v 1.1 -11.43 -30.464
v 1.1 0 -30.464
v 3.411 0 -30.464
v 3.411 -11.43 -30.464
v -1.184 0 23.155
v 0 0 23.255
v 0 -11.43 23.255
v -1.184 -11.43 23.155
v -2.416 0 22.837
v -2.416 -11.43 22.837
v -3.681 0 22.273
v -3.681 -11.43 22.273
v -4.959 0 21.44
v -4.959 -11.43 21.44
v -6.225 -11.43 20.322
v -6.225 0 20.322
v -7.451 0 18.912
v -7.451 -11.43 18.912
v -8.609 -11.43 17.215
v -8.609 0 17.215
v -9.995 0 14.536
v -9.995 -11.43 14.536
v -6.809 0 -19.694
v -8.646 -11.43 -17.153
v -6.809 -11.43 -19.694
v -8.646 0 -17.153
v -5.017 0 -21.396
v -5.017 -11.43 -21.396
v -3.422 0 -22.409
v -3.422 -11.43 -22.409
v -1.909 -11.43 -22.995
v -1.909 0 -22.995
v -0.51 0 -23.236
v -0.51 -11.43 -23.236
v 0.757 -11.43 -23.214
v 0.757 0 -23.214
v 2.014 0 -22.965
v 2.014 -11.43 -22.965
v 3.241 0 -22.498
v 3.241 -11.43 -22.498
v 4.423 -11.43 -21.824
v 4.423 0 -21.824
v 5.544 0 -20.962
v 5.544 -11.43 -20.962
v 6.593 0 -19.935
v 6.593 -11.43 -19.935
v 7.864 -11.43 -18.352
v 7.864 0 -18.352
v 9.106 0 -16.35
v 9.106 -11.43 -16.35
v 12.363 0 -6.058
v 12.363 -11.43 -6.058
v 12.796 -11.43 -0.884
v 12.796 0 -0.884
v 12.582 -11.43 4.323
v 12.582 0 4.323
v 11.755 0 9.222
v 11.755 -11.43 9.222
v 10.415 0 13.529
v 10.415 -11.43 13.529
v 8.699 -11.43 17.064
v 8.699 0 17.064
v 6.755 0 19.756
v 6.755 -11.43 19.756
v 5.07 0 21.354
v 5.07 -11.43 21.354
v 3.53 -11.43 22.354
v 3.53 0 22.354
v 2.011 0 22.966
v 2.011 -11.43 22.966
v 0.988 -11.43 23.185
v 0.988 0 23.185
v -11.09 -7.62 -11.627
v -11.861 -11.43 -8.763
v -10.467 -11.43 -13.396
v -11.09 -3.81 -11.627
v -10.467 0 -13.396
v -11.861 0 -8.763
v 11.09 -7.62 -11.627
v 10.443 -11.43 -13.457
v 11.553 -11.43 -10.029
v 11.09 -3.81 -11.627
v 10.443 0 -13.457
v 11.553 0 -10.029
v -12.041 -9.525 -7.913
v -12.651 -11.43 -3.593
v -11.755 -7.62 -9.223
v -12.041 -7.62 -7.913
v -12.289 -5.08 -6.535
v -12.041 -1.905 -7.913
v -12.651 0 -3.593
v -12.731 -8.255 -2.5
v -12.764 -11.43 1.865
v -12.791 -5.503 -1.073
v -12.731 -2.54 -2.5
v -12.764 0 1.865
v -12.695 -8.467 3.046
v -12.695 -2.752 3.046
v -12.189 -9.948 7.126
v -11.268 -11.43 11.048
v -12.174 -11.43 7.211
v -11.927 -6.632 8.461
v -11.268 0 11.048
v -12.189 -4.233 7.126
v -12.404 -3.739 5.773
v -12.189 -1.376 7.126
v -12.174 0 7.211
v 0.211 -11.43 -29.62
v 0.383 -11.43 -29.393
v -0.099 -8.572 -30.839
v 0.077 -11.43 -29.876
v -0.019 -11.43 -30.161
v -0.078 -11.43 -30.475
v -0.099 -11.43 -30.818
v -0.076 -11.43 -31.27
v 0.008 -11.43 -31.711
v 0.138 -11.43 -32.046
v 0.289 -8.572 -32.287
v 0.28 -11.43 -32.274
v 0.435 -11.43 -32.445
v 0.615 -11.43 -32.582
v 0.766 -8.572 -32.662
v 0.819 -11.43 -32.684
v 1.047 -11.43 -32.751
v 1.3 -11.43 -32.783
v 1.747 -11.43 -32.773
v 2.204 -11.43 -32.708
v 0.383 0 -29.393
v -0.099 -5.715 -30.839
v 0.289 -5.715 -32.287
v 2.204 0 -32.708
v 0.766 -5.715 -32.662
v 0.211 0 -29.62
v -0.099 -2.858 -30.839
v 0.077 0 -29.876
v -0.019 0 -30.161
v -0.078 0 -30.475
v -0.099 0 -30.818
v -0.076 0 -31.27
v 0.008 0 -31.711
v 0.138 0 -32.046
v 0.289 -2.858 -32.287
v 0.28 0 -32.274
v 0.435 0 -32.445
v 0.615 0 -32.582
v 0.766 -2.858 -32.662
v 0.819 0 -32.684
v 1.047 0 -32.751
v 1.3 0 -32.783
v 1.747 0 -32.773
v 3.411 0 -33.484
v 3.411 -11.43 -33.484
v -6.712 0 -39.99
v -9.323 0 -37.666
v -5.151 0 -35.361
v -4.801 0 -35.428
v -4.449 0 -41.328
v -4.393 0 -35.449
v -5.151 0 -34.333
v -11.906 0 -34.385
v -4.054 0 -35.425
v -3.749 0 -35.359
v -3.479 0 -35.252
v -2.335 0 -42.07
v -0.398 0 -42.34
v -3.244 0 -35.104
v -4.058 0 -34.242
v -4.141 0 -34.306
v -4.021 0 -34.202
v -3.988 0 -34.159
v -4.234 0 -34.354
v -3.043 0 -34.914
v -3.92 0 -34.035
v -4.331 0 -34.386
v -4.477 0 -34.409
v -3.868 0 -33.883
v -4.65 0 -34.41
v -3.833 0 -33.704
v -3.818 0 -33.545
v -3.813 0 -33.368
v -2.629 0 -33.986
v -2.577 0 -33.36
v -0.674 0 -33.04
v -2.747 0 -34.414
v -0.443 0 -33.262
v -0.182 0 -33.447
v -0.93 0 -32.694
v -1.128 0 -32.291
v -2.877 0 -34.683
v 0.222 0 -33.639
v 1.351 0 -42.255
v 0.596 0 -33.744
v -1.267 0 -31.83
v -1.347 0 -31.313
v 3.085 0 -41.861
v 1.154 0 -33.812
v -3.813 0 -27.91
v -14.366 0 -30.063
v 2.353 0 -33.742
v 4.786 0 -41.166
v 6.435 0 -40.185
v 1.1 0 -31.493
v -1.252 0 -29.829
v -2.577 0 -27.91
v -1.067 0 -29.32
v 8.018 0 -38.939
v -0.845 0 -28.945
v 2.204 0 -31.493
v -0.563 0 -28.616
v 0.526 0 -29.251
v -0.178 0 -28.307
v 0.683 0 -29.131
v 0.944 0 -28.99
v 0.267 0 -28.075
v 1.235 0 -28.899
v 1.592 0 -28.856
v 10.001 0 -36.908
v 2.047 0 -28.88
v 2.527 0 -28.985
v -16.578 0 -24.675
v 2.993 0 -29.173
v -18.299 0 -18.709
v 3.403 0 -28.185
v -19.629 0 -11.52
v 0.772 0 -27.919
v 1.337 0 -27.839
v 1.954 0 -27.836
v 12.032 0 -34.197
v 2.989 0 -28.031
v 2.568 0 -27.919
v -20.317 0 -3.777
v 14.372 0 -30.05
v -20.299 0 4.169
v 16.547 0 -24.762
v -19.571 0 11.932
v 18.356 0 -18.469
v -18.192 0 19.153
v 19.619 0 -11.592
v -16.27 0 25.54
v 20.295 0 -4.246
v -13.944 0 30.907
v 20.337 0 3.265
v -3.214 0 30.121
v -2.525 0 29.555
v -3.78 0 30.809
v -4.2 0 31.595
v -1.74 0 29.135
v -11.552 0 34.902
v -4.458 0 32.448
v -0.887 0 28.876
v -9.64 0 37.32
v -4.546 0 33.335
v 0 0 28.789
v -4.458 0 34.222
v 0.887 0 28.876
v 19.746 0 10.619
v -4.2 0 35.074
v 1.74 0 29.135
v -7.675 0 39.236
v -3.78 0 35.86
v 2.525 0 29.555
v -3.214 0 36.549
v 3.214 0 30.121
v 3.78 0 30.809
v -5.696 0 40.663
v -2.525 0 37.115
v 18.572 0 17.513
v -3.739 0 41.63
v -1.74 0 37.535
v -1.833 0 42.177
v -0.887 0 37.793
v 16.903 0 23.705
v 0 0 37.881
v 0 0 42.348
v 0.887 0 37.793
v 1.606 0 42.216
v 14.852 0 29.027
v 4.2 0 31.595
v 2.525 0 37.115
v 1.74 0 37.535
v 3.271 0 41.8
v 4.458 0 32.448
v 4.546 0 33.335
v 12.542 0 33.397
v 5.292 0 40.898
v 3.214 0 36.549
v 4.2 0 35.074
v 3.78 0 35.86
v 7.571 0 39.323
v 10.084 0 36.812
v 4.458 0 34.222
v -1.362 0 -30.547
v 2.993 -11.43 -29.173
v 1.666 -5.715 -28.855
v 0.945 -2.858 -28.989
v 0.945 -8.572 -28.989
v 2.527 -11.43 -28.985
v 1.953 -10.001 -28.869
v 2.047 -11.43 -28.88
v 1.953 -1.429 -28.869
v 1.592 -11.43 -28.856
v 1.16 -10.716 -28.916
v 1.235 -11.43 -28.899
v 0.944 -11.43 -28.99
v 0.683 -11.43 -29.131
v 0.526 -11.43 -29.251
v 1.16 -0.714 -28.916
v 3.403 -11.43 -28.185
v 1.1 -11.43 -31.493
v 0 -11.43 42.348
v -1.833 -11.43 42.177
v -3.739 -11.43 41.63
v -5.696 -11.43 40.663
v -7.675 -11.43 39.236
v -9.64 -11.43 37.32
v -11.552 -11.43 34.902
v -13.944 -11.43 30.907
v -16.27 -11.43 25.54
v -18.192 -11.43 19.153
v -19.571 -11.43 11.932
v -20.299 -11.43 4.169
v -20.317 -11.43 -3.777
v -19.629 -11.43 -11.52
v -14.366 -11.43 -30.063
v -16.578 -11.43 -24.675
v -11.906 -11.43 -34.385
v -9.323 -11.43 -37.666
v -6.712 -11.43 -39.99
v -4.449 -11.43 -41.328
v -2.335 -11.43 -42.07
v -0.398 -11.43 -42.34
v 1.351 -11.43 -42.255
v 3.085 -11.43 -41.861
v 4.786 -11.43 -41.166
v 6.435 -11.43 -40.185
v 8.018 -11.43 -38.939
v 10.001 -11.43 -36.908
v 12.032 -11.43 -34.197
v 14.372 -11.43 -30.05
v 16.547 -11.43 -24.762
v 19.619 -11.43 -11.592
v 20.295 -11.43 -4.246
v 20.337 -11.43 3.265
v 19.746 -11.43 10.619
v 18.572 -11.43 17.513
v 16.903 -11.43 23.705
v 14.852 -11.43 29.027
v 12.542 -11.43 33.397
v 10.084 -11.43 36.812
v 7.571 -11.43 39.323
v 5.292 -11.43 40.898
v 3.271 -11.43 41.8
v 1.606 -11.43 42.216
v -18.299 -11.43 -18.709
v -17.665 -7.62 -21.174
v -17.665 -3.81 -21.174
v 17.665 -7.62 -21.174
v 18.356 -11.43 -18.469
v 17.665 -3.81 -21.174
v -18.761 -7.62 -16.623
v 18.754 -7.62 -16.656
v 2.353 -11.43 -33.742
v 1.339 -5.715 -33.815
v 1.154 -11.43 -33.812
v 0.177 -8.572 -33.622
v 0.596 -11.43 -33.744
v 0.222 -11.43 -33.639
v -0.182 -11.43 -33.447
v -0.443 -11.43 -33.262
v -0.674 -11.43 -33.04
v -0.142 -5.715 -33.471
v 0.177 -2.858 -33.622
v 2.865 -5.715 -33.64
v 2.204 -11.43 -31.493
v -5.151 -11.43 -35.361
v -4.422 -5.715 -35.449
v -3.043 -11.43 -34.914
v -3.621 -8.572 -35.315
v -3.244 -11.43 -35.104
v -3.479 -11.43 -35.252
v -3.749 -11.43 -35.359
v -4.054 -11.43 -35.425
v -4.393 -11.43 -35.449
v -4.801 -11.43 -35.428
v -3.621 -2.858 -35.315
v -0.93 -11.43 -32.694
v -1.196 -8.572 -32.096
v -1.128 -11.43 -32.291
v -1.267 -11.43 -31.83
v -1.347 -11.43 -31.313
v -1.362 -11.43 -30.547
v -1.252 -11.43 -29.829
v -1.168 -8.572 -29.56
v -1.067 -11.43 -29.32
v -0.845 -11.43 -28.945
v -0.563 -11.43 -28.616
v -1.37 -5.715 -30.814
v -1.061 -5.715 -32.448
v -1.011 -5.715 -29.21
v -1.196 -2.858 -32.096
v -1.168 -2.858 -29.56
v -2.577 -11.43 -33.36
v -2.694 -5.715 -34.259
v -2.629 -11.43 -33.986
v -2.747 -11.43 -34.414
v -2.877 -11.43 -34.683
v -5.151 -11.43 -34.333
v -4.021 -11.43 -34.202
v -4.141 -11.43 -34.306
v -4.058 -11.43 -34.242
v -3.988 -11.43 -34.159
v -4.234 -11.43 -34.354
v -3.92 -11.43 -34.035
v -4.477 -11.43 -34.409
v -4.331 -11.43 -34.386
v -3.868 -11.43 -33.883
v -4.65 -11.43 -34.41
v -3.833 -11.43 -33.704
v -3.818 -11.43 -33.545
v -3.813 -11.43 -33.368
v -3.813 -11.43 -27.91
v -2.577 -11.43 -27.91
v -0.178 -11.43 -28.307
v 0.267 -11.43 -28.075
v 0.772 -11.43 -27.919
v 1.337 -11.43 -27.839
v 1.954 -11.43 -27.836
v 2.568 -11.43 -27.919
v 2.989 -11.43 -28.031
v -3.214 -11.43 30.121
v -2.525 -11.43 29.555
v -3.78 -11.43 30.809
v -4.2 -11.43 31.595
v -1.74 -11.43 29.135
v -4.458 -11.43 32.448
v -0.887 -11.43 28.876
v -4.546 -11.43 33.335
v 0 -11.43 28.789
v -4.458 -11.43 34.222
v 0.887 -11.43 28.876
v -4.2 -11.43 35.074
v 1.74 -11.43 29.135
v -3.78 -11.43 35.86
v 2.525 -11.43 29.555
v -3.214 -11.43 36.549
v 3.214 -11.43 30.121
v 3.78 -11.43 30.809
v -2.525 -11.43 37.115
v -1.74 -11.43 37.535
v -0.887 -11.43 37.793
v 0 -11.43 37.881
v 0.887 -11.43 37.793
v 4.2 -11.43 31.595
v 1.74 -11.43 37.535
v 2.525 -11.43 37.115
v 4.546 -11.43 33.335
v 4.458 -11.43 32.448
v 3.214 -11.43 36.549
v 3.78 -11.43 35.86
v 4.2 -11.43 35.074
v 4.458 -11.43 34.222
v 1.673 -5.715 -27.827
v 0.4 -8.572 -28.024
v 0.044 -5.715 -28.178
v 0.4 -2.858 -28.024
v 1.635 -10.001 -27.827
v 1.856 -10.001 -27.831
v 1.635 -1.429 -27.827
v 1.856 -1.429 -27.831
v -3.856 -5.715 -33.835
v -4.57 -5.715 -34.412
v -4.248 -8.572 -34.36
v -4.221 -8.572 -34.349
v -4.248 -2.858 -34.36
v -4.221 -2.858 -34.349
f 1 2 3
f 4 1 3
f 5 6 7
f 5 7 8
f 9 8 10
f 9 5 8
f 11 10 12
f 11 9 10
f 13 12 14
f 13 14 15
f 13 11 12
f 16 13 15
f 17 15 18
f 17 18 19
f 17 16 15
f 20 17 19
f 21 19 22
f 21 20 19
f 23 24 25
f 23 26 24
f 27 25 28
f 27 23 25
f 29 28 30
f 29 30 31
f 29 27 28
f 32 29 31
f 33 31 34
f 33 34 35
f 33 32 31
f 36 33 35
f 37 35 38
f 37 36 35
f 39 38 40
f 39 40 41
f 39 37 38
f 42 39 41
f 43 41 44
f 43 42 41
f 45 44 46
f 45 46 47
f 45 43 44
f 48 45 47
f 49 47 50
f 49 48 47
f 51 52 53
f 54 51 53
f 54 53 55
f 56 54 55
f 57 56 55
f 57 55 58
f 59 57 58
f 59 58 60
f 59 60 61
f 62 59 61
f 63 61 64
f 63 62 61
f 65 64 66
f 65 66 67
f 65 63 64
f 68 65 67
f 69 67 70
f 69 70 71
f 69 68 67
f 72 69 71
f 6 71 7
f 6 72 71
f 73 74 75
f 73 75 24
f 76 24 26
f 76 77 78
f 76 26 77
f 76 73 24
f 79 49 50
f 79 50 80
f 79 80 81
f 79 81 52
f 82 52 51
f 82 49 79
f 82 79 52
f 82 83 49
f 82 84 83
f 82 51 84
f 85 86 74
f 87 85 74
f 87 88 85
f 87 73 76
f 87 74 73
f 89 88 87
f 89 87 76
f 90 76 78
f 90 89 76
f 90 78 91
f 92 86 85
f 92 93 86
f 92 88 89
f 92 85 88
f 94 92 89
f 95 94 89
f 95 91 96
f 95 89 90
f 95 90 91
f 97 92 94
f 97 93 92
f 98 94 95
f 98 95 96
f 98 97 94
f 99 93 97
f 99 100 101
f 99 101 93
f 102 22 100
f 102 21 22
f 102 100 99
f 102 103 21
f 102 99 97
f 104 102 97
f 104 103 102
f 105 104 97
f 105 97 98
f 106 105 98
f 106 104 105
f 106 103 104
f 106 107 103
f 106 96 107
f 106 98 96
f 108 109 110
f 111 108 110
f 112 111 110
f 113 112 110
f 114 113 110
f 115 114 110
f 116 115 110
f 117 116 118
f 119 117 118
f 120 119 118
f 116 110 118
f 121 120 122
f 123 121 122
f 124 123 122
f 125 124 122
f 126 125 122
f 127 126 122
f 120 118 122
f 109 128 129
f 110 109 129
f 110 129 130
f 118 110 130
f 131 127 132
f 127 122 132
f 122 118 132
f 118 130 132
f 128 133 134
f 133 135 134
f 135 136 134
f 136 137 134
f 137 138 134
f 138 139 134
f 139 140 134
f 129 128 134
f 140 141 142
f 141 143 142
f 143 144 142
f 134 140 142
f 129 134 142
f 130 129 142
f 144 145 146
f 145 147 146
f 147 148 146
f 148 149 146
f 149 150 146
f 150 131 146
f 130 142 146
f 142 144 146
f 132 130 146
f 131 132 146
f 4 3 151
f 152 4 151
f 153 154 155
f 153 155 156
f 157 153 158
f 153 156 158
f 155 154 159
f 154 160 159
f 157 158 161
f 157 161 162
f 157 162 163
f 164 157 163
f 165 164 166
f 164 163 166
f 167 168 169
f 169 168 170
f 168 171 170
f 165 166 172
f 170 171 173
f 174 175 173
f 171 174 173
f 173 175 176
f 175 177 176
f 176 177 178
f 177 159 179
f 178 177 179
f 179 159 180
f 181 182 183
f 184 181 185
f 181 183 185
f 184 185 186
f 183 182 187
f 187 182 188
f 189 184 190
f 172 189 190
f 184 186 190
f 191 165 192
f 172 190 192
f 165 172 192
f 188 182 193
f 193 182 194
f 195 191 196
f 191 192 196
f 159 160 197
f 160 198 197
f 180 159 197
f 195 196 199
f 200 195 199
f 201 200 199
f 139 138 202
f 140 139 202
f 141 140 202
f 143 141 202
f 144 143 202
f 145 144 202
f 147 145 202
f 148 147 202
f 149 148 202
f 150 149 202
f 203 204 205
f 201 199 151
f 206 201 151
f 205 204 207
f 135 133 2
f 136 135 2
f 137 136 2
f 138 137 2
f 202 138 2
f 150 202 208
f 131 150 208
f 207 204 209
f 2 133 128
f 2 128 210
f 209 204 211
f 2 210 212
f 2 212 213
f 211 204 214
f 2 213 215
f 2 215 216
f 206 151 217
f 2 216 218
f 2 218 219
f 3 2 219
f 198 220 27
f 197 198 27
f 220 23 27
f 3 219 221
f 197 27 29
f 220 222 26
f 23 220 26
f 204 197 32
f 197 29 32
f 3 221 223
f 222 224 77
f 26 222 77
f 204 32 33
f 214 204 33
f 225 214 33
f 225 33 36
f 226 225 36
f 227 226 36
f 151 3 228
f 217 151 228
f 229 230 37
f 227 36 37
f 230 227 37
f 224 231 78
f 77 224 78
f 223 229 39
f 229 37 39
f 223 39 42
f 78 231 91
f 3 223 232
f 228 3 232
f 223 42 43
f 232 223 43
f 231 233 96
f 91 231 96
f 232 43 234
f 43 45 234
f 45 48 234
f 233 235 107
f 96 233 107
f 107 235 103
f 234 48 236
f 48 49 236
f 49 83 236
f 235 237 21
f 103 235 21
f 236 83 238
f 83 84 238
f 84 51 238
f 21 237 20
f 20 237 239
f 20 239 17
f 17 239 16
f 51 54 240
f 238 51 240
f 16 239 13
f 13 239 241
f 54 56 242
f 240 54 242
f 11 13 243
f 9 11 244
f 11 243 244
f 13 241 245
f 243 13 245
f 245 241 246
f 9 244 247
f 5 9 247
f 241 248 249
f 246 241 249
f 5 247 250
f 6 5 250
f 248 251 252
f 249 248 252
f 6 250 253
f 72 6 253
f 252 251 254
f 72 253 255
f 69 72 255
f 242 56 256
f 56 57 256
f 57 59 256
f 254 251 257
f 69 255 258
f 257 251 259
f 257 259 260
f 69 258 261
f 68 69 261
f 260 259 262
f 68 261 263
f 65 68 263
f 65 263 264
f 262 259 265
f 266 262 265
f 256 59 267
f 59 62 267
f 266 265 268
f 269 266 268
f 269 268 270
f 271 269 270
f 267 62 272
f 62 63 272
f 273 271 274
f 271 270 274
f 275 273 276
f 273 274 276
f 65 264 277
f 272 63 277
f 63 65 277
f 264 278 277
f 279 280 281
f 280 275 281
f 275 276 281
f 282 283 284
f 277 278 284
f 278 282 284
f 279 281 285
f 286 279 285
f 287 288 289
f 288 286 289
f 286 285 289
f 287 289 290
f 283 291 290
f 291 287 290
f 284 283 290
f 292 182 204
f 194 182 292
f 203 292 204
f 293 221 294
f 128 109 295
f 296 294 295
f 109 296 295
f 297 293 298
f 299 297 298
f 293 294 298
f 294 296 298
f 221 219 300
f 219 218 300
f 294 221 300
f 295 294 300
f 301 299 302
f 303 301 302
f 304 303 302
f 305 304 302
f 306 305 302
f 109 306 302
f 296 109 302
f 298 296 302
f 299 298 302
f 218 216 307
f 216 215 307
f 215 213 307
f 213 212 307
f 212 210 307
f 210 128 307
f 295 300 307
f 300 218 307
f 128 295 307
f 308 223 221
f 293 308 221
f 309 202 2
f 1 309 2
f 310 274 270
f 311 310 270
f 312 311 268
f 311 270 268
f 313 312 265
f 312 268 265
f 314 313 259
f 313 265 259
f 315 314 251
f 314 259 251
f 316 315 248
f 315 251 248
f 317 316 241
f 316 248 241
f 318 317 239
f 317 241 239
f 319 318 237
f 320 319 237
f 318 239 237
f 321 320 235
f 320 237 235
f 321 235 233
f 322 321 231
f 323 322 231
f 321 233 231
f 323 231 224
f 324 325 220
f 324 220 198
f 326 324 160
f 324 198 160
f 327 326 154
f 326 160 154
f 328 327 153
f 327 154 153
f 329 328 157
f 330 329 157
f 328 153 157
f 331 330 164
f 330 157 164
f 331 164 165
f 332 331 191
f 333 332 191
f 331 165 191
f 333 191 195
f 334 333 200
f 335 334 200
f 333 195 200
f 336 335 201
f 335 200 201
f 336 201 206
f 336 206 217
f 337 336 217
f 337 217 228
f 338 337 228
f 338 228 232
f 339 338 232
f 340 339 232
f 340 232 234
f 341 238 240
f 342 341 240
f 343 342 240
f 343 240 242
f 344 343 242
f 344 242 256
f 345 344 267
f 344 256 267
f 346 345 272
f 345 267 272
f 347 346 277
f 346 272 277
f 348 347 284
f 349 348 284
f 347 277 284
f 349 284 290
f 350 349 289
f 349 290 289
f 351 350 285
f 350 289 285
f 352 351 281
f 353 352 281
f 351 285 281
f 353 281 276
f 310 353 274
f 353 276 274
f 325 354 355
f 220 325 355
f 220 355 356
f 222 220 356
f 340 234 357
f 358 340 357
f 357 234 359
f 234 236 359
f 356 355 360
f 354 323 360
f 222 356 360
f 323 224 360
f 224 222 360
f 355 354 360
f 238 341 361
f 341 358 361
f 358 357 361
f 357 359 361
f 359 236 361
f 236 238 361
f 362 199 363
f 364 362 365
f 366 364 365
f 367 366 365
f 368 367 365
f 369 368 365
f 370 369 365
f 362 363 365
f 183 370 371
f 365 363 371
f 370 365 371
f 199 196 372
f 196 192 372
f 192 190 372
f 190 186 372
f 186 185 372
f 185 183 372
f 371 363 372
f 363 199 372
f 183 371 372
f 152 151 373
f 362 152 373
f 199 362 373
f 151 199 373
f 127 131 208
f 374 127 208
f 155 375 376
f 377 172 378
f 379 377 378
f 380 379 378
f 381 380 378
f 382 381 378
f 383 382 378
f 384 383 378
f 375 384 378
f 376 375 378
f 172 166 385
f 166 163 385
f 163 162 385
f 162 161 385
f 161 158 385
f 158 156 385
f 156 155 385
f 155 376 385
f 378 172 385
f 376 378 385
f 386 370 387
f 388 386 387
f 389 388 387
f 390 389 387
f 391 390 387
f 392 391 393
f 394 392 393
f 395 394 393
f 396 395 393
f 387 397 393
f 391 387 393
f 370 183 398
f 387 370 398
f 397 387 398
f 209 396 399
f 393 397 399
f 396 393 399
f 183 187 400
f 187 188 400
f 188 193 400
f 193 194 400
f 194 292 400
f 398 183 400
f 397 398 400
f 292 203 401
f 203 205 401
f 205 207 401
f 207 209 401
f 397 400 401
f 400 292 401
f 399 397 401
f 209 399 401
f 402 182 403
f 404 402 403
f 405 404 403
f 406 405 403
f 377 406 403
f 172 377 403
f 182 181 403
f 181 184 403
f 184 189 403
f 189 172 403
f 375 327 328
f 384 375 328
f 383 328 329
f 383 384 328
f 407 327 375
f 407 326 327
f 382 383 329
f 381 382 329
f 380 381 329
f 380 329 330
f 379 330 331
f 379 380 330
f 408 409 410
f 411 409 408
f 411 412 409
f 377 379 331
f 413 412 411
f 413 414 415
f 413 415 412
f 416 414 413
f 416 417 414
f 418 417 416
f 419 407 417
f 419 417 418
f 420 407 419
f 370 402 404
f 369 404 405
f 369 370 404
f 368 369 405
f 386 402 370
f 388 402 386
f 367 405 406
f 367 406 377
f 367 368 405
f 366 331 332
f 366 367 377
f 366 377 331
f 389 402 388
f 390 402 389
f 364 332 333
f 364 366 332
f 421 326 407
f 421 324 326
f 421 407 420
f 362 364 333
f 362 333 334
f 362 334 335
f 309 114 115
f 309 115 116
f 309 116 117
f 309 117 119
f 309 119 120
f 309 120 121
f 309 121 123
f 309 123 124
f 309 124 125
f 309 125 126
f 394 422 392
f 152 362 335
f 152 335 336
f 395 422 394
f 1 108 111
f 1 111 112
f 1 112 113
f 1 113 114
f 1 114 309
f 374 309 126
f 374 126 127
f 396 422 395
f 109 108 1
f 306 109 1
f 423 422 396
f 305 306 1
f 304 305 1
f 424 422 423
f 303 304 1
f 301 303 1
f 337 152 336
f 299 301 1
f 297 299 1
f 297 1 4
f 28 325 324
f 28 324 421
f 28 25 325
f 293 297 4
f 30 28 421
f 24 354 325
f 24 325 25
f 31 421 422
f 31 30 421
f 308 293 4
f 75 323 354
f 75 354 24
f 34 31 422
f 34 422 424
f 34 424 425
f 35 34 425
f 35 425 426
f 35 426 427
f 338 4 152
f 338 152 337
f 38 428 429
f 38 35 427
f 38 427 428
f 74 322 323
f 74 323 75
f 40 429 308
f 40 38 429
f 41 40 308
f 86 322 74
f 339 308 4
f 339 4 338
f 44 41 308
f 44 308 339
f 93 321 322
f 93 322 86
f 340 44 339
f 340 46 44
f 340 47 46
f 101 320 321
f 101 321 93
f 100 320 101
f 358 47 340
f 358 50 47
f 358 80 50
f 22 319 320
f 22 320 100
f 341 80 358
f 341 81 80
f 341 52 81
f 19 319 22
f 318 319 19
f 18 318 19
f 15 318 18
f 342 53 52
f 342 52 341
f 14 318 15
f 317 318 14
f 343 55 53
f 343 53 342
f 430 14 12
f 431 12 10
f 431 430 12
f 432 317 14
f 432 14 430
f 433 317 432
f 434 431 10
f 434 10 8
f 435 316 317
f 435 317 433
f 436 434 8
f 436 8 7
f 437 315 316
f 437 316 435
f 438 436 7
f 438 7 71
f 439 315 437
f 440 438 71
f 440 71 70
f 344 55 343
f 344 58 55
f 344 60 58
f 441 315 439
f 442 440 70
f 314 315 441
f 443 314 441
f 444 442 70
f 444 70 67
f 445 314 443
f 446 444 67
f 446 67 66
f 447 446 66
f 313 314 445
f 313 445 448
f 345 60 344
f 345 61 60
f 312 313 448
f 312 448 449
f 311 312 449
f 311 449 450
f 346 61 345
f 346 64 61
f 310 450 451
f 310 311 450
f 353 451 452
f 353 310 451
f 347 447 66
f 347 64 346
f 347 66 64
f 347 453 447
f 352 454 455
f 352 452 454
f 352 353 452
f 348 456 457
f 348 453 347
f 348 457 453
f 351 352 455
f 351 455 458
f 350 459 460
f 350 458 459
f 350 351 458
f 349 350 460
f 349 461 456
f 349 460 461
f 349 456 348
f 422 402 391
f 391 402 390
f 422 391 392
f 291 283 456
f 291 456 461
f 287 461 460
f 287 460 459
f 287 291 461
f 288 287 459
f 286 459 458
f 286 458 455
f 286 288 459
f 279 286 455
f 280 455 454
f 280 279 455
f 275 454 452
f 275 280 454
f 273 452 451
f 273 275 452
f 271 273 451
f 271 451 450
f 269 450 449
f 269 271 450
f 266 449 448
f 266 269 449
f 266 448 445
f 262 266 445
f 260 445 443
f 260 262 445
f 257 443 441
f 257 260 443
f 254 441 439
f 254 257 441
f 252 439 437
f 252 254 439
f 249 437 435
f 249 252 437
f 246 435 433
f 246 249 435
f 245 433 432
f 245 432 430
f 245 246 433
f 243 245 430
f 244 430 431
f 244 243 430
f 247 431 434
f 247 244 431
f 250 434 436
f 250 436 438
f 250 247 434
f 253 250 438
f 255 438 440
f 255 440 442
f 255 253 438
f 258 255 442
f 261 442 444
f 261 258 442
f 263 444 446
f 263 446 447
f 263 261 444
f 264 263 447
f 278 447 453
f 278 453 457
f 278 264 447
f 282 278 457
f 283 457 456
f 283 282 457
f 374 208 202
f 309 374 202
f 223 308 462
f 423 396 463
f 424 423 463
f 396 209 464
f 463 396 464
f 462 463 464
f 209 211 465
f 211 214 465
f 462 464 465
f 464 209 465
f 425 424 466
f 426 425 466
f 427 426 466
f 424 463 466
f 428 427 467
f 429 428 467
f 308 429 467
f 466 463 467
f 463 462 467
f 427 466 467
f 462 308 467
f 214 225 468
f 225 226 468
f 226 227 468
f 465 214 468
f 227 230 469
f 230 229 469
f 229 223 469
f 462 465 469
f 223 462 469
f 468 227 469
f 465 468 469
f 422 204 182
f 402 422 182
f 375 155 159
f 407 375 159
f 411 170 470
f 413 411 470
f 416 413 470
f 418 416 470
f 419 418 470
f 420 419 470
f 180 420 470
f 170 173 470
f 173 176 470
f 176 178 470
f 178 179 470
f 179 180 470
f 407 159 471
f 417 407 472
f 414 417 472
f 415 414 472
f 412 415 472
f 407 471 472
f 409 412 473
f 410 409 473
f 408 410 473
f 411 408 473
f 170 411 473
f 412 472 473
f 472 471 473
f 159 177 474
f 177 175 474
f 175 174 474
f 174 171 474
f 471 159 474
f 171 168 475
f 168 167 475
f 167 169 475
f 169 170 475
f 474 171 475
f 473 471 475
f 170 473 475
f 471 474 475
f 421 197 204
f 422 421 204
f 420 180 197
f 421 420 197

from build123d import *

# Parameters (mm, degrees)
F0_R     = 4.5457502189
F1_DEPTH = 11.43


with BuildPart() as f1:
    # F0 (on Front) → F1 (new body)
    with BuildSketch(Plane.XZ):
        with BuildLine():
            add(Edge.make_bspline(
                [(0, 42.3479527235), (-35.330022789, 42.3479527235), (-17.6650113945, -21.1739763618), (0, -84.695905447), (17.6650113945, -21.1739763618), (35.330022789, 42.3479527235), (0, 42.3479527235)],
                knots=[0, 0, 0, 2.0943951024, 2.0943951024, 4.1887902048, 4.1887902048, 6.2831853072, 6.2831853072, 6.2831853072], degree=2, weights=[1, 0.5, 1, 0.5, 1, 0.5, 1]))
        make_face()
        with BuildLine():
            add(Edge.make_bspline(
                [(-3.0432494103, -34.9144779167), (-3.5092350239, -35.4486720947), (-4.4220823543, -35.4486720947)],
                knots=[0, 0, 0, 1, 1, 1], degree=2))
            add(Edge.make_bspline(
                [(-4.4220823543, -35.4486720947), (-4.8402582264, -35.4486720947), (-5.1513402775, -35.3607021704)],
                knots=[0, 0, 0, 1, 1, 1], degree=2))
            Line((-5.1513402775, -35.3607021704), (-5.1513402775, -34.3331114604))
            add(Edge.make_bspline(
                [(-5.1513402775, -34.3331114604), (-4.8326086677, -34.4121568996), (-4.5699738213, -34.4121568996)],
                knots=[0, 0, 0, 1, 1, 1], degree=2))
            add(Edge.make_bspline(
                [(-4.5699738213, -34.4121568996), (-4.1632722872, -34.4121568996), (-3.9879699018, -34.1590840015)],
                knots=[0, 0, 0, 1, 1, 1], degree=2))
            add(Edge.make_bspline(
                [(-3.9879699018, -34.1590840015), (-3.8126675164, -33.9060111033), (-3.8126675164, -33.3679921459)],
                knots=[0, 0, 0, 1, 1, 1], degree=2))
            Line((-3.8126675164, -33.3679921459), (-3.8126675164, -27.9100320598))
            Line((-3.8126675164, -27.9100320598), (-2.5772637968, -27.9100320598))
            Line((-2.5772637968, -27.9100320598), (-2.5772637968, -33.3603425873))
            add(Edge.make_bspline(
                [(-2.5772637968, -33.3603425873), (-2.5772637968, -34.3802837387), (-3.0432494103, -34.9144779167)],
                knots=[0, 0, 0, 1, 1, 1], degree=2))
        make_face(mode=Mode.SUBTRACT)
        with BuildLine():
            Line((1.0996240538, -31.4925753539), (1.0996240538, -30.4637097175))
            Line((1.0996240538, -30.4637097175), (3.411065688, -30.4637097175))
            Line((3.411065688, -30.4637097175), (3.411065688, -33.4840104519))
            add(Edge.make_bspline(
                [(3.411065688, -33.4840104519), (2.8488231284, -33.6675998591), (2.3528767435, -33.7415455926)],
                knots=[0, 0, 0, 1, 1, 1], degree=2))
            add(Edge.make_bspline(
                [(2.3528767435, -33.7415455926), (1.8569303587, -33.8154913261), (1.3393102244, -33.8154913261)],
                knots=[0, 0, 0, 1, 1, 1], degree=2))
            add(Edge.make_bspline(
                [(1.3393102244, -33.8154913261), (0.0210362862, -33.8154913261), (-0.6744360863, -33.0403360511)],
                knots=[0, 0, 0, 1, 1, 1], degree=2))
            add(Edge.make_bspline(
                [(-0.6744360863, -33.0403360511), (-1.3699084589, -32.265180776), (-1.3699084589, -30.8143144883)],
                knots=[0, 0, 0, 1, 1, 1], degree=2))
            add(Edge.make_bspline(
                [(-1.3699084589, -30.8143144883), (-1.3699084589, -29.4042458465), (-0.5628800229, -28.6157038439)],
                knots=[0, 0, 0, 1, 1, 1], degree=2))
            add(Edge.make_bspline(
                [(-0.5628800229, -28.6157038439), (0.2441484131, -27.8271618412), (1.6733409514, -27.8271618412)],
                knots=[0, 0, 0, 1, 1, 1], degree=2))
            add(Edge.make_bspline(
                [(1.6733409514, -27.8271618412), (2.5708891646, -27.8271618412), (3.4034161294, -28.1854161706)],
                knots=[0, 0, 0, 1, 1, 1], degree=2))
            Line((3.4034161294, -28.1854161706), (2.992889816, -29.173484161))
            add(Edge.make_bspline(
                [(2.992889816, -29.173484161), (2.3554265964, -28.8547525512), (1.6656913928, -28.8547525512)],
                knots=[0, 0, 0, 1, 1, 1], degree=2))
            add(Edge.make_bspline(
                [(1.6656913928, -28.8547525512), (0.865037589, -28.8547525512), (0.383115395, -29.3927715086)],
                knots=[0, 0, 0, 1, 1, 1], degree=2))
            add(Edge.make_bspline(
                [(0.383115395, -29.3927715086), (-0.098806799, -29.9307904659), (-0.098806799, -30.8385380906)],
                knots=[0, 0, 0, 1, 1, 1], degree=2))
            add(Edge.make_bspline(
                [(-0.098806799, -30.8385380906), (-0.098806799, -31.7870833613), (0.2894083017, -32.2868545255)],
                knots=[0, 0, 0, 1, 1, 1], degree=2))
            add(Edge.make_bspline(
                [(0.2894083017, -32.2868545255), (0.6776234024, -32.7866256897), (1.4183556636, -32.7866256897)],
                knots=[0, 0, 0, 1, 1, 1], degree=2))
            add(Edge.make_bspline(
                [(1.4183556636, -32.7866256897), (1.8059333011, -32.7866256897), (2.2037103501, -32.7075802504)],
                knots=[0, 0, 0, 1, 1, 1], degree=2))
            Line((2.2037103501, -32.7075802504), (2.2037103501, -31.4925753539))
            Line((2.2037103501, -31.4925753539), (1.0996240538, -31.4925753539))
        make_face(mode=Mode.SUBTRACT)
        with BuildLine():
            add(Edge.make_bspline(
                [(0, 23.2546553016), (-22.1790441059, 23.2546553016), (-11.089522053, -11.6273276508), (0, -46.5093106031), (11.089522053, -11.6273276508), (22.1790441059, 23.2546553016), (0, 23.2546553016)],
                knots=[0, 0, 0, 2.0943951024, 2.0943951024, 4.1887902048, 4.1887902048, 6.2831853072, 6.2831853072, 6.2831853072], degree=2, weights=[1, 0.5, 1, 0.5, 1, 0.5, 1]))
        make_face(mode=Mode.SUBTRACT)
        with Locations((0, 33.334877342)):
            Circle(F0_R, mode=Mode.SUBTRACT)
    extrude(amount=F1_DEPTH)


solid = f1.part
